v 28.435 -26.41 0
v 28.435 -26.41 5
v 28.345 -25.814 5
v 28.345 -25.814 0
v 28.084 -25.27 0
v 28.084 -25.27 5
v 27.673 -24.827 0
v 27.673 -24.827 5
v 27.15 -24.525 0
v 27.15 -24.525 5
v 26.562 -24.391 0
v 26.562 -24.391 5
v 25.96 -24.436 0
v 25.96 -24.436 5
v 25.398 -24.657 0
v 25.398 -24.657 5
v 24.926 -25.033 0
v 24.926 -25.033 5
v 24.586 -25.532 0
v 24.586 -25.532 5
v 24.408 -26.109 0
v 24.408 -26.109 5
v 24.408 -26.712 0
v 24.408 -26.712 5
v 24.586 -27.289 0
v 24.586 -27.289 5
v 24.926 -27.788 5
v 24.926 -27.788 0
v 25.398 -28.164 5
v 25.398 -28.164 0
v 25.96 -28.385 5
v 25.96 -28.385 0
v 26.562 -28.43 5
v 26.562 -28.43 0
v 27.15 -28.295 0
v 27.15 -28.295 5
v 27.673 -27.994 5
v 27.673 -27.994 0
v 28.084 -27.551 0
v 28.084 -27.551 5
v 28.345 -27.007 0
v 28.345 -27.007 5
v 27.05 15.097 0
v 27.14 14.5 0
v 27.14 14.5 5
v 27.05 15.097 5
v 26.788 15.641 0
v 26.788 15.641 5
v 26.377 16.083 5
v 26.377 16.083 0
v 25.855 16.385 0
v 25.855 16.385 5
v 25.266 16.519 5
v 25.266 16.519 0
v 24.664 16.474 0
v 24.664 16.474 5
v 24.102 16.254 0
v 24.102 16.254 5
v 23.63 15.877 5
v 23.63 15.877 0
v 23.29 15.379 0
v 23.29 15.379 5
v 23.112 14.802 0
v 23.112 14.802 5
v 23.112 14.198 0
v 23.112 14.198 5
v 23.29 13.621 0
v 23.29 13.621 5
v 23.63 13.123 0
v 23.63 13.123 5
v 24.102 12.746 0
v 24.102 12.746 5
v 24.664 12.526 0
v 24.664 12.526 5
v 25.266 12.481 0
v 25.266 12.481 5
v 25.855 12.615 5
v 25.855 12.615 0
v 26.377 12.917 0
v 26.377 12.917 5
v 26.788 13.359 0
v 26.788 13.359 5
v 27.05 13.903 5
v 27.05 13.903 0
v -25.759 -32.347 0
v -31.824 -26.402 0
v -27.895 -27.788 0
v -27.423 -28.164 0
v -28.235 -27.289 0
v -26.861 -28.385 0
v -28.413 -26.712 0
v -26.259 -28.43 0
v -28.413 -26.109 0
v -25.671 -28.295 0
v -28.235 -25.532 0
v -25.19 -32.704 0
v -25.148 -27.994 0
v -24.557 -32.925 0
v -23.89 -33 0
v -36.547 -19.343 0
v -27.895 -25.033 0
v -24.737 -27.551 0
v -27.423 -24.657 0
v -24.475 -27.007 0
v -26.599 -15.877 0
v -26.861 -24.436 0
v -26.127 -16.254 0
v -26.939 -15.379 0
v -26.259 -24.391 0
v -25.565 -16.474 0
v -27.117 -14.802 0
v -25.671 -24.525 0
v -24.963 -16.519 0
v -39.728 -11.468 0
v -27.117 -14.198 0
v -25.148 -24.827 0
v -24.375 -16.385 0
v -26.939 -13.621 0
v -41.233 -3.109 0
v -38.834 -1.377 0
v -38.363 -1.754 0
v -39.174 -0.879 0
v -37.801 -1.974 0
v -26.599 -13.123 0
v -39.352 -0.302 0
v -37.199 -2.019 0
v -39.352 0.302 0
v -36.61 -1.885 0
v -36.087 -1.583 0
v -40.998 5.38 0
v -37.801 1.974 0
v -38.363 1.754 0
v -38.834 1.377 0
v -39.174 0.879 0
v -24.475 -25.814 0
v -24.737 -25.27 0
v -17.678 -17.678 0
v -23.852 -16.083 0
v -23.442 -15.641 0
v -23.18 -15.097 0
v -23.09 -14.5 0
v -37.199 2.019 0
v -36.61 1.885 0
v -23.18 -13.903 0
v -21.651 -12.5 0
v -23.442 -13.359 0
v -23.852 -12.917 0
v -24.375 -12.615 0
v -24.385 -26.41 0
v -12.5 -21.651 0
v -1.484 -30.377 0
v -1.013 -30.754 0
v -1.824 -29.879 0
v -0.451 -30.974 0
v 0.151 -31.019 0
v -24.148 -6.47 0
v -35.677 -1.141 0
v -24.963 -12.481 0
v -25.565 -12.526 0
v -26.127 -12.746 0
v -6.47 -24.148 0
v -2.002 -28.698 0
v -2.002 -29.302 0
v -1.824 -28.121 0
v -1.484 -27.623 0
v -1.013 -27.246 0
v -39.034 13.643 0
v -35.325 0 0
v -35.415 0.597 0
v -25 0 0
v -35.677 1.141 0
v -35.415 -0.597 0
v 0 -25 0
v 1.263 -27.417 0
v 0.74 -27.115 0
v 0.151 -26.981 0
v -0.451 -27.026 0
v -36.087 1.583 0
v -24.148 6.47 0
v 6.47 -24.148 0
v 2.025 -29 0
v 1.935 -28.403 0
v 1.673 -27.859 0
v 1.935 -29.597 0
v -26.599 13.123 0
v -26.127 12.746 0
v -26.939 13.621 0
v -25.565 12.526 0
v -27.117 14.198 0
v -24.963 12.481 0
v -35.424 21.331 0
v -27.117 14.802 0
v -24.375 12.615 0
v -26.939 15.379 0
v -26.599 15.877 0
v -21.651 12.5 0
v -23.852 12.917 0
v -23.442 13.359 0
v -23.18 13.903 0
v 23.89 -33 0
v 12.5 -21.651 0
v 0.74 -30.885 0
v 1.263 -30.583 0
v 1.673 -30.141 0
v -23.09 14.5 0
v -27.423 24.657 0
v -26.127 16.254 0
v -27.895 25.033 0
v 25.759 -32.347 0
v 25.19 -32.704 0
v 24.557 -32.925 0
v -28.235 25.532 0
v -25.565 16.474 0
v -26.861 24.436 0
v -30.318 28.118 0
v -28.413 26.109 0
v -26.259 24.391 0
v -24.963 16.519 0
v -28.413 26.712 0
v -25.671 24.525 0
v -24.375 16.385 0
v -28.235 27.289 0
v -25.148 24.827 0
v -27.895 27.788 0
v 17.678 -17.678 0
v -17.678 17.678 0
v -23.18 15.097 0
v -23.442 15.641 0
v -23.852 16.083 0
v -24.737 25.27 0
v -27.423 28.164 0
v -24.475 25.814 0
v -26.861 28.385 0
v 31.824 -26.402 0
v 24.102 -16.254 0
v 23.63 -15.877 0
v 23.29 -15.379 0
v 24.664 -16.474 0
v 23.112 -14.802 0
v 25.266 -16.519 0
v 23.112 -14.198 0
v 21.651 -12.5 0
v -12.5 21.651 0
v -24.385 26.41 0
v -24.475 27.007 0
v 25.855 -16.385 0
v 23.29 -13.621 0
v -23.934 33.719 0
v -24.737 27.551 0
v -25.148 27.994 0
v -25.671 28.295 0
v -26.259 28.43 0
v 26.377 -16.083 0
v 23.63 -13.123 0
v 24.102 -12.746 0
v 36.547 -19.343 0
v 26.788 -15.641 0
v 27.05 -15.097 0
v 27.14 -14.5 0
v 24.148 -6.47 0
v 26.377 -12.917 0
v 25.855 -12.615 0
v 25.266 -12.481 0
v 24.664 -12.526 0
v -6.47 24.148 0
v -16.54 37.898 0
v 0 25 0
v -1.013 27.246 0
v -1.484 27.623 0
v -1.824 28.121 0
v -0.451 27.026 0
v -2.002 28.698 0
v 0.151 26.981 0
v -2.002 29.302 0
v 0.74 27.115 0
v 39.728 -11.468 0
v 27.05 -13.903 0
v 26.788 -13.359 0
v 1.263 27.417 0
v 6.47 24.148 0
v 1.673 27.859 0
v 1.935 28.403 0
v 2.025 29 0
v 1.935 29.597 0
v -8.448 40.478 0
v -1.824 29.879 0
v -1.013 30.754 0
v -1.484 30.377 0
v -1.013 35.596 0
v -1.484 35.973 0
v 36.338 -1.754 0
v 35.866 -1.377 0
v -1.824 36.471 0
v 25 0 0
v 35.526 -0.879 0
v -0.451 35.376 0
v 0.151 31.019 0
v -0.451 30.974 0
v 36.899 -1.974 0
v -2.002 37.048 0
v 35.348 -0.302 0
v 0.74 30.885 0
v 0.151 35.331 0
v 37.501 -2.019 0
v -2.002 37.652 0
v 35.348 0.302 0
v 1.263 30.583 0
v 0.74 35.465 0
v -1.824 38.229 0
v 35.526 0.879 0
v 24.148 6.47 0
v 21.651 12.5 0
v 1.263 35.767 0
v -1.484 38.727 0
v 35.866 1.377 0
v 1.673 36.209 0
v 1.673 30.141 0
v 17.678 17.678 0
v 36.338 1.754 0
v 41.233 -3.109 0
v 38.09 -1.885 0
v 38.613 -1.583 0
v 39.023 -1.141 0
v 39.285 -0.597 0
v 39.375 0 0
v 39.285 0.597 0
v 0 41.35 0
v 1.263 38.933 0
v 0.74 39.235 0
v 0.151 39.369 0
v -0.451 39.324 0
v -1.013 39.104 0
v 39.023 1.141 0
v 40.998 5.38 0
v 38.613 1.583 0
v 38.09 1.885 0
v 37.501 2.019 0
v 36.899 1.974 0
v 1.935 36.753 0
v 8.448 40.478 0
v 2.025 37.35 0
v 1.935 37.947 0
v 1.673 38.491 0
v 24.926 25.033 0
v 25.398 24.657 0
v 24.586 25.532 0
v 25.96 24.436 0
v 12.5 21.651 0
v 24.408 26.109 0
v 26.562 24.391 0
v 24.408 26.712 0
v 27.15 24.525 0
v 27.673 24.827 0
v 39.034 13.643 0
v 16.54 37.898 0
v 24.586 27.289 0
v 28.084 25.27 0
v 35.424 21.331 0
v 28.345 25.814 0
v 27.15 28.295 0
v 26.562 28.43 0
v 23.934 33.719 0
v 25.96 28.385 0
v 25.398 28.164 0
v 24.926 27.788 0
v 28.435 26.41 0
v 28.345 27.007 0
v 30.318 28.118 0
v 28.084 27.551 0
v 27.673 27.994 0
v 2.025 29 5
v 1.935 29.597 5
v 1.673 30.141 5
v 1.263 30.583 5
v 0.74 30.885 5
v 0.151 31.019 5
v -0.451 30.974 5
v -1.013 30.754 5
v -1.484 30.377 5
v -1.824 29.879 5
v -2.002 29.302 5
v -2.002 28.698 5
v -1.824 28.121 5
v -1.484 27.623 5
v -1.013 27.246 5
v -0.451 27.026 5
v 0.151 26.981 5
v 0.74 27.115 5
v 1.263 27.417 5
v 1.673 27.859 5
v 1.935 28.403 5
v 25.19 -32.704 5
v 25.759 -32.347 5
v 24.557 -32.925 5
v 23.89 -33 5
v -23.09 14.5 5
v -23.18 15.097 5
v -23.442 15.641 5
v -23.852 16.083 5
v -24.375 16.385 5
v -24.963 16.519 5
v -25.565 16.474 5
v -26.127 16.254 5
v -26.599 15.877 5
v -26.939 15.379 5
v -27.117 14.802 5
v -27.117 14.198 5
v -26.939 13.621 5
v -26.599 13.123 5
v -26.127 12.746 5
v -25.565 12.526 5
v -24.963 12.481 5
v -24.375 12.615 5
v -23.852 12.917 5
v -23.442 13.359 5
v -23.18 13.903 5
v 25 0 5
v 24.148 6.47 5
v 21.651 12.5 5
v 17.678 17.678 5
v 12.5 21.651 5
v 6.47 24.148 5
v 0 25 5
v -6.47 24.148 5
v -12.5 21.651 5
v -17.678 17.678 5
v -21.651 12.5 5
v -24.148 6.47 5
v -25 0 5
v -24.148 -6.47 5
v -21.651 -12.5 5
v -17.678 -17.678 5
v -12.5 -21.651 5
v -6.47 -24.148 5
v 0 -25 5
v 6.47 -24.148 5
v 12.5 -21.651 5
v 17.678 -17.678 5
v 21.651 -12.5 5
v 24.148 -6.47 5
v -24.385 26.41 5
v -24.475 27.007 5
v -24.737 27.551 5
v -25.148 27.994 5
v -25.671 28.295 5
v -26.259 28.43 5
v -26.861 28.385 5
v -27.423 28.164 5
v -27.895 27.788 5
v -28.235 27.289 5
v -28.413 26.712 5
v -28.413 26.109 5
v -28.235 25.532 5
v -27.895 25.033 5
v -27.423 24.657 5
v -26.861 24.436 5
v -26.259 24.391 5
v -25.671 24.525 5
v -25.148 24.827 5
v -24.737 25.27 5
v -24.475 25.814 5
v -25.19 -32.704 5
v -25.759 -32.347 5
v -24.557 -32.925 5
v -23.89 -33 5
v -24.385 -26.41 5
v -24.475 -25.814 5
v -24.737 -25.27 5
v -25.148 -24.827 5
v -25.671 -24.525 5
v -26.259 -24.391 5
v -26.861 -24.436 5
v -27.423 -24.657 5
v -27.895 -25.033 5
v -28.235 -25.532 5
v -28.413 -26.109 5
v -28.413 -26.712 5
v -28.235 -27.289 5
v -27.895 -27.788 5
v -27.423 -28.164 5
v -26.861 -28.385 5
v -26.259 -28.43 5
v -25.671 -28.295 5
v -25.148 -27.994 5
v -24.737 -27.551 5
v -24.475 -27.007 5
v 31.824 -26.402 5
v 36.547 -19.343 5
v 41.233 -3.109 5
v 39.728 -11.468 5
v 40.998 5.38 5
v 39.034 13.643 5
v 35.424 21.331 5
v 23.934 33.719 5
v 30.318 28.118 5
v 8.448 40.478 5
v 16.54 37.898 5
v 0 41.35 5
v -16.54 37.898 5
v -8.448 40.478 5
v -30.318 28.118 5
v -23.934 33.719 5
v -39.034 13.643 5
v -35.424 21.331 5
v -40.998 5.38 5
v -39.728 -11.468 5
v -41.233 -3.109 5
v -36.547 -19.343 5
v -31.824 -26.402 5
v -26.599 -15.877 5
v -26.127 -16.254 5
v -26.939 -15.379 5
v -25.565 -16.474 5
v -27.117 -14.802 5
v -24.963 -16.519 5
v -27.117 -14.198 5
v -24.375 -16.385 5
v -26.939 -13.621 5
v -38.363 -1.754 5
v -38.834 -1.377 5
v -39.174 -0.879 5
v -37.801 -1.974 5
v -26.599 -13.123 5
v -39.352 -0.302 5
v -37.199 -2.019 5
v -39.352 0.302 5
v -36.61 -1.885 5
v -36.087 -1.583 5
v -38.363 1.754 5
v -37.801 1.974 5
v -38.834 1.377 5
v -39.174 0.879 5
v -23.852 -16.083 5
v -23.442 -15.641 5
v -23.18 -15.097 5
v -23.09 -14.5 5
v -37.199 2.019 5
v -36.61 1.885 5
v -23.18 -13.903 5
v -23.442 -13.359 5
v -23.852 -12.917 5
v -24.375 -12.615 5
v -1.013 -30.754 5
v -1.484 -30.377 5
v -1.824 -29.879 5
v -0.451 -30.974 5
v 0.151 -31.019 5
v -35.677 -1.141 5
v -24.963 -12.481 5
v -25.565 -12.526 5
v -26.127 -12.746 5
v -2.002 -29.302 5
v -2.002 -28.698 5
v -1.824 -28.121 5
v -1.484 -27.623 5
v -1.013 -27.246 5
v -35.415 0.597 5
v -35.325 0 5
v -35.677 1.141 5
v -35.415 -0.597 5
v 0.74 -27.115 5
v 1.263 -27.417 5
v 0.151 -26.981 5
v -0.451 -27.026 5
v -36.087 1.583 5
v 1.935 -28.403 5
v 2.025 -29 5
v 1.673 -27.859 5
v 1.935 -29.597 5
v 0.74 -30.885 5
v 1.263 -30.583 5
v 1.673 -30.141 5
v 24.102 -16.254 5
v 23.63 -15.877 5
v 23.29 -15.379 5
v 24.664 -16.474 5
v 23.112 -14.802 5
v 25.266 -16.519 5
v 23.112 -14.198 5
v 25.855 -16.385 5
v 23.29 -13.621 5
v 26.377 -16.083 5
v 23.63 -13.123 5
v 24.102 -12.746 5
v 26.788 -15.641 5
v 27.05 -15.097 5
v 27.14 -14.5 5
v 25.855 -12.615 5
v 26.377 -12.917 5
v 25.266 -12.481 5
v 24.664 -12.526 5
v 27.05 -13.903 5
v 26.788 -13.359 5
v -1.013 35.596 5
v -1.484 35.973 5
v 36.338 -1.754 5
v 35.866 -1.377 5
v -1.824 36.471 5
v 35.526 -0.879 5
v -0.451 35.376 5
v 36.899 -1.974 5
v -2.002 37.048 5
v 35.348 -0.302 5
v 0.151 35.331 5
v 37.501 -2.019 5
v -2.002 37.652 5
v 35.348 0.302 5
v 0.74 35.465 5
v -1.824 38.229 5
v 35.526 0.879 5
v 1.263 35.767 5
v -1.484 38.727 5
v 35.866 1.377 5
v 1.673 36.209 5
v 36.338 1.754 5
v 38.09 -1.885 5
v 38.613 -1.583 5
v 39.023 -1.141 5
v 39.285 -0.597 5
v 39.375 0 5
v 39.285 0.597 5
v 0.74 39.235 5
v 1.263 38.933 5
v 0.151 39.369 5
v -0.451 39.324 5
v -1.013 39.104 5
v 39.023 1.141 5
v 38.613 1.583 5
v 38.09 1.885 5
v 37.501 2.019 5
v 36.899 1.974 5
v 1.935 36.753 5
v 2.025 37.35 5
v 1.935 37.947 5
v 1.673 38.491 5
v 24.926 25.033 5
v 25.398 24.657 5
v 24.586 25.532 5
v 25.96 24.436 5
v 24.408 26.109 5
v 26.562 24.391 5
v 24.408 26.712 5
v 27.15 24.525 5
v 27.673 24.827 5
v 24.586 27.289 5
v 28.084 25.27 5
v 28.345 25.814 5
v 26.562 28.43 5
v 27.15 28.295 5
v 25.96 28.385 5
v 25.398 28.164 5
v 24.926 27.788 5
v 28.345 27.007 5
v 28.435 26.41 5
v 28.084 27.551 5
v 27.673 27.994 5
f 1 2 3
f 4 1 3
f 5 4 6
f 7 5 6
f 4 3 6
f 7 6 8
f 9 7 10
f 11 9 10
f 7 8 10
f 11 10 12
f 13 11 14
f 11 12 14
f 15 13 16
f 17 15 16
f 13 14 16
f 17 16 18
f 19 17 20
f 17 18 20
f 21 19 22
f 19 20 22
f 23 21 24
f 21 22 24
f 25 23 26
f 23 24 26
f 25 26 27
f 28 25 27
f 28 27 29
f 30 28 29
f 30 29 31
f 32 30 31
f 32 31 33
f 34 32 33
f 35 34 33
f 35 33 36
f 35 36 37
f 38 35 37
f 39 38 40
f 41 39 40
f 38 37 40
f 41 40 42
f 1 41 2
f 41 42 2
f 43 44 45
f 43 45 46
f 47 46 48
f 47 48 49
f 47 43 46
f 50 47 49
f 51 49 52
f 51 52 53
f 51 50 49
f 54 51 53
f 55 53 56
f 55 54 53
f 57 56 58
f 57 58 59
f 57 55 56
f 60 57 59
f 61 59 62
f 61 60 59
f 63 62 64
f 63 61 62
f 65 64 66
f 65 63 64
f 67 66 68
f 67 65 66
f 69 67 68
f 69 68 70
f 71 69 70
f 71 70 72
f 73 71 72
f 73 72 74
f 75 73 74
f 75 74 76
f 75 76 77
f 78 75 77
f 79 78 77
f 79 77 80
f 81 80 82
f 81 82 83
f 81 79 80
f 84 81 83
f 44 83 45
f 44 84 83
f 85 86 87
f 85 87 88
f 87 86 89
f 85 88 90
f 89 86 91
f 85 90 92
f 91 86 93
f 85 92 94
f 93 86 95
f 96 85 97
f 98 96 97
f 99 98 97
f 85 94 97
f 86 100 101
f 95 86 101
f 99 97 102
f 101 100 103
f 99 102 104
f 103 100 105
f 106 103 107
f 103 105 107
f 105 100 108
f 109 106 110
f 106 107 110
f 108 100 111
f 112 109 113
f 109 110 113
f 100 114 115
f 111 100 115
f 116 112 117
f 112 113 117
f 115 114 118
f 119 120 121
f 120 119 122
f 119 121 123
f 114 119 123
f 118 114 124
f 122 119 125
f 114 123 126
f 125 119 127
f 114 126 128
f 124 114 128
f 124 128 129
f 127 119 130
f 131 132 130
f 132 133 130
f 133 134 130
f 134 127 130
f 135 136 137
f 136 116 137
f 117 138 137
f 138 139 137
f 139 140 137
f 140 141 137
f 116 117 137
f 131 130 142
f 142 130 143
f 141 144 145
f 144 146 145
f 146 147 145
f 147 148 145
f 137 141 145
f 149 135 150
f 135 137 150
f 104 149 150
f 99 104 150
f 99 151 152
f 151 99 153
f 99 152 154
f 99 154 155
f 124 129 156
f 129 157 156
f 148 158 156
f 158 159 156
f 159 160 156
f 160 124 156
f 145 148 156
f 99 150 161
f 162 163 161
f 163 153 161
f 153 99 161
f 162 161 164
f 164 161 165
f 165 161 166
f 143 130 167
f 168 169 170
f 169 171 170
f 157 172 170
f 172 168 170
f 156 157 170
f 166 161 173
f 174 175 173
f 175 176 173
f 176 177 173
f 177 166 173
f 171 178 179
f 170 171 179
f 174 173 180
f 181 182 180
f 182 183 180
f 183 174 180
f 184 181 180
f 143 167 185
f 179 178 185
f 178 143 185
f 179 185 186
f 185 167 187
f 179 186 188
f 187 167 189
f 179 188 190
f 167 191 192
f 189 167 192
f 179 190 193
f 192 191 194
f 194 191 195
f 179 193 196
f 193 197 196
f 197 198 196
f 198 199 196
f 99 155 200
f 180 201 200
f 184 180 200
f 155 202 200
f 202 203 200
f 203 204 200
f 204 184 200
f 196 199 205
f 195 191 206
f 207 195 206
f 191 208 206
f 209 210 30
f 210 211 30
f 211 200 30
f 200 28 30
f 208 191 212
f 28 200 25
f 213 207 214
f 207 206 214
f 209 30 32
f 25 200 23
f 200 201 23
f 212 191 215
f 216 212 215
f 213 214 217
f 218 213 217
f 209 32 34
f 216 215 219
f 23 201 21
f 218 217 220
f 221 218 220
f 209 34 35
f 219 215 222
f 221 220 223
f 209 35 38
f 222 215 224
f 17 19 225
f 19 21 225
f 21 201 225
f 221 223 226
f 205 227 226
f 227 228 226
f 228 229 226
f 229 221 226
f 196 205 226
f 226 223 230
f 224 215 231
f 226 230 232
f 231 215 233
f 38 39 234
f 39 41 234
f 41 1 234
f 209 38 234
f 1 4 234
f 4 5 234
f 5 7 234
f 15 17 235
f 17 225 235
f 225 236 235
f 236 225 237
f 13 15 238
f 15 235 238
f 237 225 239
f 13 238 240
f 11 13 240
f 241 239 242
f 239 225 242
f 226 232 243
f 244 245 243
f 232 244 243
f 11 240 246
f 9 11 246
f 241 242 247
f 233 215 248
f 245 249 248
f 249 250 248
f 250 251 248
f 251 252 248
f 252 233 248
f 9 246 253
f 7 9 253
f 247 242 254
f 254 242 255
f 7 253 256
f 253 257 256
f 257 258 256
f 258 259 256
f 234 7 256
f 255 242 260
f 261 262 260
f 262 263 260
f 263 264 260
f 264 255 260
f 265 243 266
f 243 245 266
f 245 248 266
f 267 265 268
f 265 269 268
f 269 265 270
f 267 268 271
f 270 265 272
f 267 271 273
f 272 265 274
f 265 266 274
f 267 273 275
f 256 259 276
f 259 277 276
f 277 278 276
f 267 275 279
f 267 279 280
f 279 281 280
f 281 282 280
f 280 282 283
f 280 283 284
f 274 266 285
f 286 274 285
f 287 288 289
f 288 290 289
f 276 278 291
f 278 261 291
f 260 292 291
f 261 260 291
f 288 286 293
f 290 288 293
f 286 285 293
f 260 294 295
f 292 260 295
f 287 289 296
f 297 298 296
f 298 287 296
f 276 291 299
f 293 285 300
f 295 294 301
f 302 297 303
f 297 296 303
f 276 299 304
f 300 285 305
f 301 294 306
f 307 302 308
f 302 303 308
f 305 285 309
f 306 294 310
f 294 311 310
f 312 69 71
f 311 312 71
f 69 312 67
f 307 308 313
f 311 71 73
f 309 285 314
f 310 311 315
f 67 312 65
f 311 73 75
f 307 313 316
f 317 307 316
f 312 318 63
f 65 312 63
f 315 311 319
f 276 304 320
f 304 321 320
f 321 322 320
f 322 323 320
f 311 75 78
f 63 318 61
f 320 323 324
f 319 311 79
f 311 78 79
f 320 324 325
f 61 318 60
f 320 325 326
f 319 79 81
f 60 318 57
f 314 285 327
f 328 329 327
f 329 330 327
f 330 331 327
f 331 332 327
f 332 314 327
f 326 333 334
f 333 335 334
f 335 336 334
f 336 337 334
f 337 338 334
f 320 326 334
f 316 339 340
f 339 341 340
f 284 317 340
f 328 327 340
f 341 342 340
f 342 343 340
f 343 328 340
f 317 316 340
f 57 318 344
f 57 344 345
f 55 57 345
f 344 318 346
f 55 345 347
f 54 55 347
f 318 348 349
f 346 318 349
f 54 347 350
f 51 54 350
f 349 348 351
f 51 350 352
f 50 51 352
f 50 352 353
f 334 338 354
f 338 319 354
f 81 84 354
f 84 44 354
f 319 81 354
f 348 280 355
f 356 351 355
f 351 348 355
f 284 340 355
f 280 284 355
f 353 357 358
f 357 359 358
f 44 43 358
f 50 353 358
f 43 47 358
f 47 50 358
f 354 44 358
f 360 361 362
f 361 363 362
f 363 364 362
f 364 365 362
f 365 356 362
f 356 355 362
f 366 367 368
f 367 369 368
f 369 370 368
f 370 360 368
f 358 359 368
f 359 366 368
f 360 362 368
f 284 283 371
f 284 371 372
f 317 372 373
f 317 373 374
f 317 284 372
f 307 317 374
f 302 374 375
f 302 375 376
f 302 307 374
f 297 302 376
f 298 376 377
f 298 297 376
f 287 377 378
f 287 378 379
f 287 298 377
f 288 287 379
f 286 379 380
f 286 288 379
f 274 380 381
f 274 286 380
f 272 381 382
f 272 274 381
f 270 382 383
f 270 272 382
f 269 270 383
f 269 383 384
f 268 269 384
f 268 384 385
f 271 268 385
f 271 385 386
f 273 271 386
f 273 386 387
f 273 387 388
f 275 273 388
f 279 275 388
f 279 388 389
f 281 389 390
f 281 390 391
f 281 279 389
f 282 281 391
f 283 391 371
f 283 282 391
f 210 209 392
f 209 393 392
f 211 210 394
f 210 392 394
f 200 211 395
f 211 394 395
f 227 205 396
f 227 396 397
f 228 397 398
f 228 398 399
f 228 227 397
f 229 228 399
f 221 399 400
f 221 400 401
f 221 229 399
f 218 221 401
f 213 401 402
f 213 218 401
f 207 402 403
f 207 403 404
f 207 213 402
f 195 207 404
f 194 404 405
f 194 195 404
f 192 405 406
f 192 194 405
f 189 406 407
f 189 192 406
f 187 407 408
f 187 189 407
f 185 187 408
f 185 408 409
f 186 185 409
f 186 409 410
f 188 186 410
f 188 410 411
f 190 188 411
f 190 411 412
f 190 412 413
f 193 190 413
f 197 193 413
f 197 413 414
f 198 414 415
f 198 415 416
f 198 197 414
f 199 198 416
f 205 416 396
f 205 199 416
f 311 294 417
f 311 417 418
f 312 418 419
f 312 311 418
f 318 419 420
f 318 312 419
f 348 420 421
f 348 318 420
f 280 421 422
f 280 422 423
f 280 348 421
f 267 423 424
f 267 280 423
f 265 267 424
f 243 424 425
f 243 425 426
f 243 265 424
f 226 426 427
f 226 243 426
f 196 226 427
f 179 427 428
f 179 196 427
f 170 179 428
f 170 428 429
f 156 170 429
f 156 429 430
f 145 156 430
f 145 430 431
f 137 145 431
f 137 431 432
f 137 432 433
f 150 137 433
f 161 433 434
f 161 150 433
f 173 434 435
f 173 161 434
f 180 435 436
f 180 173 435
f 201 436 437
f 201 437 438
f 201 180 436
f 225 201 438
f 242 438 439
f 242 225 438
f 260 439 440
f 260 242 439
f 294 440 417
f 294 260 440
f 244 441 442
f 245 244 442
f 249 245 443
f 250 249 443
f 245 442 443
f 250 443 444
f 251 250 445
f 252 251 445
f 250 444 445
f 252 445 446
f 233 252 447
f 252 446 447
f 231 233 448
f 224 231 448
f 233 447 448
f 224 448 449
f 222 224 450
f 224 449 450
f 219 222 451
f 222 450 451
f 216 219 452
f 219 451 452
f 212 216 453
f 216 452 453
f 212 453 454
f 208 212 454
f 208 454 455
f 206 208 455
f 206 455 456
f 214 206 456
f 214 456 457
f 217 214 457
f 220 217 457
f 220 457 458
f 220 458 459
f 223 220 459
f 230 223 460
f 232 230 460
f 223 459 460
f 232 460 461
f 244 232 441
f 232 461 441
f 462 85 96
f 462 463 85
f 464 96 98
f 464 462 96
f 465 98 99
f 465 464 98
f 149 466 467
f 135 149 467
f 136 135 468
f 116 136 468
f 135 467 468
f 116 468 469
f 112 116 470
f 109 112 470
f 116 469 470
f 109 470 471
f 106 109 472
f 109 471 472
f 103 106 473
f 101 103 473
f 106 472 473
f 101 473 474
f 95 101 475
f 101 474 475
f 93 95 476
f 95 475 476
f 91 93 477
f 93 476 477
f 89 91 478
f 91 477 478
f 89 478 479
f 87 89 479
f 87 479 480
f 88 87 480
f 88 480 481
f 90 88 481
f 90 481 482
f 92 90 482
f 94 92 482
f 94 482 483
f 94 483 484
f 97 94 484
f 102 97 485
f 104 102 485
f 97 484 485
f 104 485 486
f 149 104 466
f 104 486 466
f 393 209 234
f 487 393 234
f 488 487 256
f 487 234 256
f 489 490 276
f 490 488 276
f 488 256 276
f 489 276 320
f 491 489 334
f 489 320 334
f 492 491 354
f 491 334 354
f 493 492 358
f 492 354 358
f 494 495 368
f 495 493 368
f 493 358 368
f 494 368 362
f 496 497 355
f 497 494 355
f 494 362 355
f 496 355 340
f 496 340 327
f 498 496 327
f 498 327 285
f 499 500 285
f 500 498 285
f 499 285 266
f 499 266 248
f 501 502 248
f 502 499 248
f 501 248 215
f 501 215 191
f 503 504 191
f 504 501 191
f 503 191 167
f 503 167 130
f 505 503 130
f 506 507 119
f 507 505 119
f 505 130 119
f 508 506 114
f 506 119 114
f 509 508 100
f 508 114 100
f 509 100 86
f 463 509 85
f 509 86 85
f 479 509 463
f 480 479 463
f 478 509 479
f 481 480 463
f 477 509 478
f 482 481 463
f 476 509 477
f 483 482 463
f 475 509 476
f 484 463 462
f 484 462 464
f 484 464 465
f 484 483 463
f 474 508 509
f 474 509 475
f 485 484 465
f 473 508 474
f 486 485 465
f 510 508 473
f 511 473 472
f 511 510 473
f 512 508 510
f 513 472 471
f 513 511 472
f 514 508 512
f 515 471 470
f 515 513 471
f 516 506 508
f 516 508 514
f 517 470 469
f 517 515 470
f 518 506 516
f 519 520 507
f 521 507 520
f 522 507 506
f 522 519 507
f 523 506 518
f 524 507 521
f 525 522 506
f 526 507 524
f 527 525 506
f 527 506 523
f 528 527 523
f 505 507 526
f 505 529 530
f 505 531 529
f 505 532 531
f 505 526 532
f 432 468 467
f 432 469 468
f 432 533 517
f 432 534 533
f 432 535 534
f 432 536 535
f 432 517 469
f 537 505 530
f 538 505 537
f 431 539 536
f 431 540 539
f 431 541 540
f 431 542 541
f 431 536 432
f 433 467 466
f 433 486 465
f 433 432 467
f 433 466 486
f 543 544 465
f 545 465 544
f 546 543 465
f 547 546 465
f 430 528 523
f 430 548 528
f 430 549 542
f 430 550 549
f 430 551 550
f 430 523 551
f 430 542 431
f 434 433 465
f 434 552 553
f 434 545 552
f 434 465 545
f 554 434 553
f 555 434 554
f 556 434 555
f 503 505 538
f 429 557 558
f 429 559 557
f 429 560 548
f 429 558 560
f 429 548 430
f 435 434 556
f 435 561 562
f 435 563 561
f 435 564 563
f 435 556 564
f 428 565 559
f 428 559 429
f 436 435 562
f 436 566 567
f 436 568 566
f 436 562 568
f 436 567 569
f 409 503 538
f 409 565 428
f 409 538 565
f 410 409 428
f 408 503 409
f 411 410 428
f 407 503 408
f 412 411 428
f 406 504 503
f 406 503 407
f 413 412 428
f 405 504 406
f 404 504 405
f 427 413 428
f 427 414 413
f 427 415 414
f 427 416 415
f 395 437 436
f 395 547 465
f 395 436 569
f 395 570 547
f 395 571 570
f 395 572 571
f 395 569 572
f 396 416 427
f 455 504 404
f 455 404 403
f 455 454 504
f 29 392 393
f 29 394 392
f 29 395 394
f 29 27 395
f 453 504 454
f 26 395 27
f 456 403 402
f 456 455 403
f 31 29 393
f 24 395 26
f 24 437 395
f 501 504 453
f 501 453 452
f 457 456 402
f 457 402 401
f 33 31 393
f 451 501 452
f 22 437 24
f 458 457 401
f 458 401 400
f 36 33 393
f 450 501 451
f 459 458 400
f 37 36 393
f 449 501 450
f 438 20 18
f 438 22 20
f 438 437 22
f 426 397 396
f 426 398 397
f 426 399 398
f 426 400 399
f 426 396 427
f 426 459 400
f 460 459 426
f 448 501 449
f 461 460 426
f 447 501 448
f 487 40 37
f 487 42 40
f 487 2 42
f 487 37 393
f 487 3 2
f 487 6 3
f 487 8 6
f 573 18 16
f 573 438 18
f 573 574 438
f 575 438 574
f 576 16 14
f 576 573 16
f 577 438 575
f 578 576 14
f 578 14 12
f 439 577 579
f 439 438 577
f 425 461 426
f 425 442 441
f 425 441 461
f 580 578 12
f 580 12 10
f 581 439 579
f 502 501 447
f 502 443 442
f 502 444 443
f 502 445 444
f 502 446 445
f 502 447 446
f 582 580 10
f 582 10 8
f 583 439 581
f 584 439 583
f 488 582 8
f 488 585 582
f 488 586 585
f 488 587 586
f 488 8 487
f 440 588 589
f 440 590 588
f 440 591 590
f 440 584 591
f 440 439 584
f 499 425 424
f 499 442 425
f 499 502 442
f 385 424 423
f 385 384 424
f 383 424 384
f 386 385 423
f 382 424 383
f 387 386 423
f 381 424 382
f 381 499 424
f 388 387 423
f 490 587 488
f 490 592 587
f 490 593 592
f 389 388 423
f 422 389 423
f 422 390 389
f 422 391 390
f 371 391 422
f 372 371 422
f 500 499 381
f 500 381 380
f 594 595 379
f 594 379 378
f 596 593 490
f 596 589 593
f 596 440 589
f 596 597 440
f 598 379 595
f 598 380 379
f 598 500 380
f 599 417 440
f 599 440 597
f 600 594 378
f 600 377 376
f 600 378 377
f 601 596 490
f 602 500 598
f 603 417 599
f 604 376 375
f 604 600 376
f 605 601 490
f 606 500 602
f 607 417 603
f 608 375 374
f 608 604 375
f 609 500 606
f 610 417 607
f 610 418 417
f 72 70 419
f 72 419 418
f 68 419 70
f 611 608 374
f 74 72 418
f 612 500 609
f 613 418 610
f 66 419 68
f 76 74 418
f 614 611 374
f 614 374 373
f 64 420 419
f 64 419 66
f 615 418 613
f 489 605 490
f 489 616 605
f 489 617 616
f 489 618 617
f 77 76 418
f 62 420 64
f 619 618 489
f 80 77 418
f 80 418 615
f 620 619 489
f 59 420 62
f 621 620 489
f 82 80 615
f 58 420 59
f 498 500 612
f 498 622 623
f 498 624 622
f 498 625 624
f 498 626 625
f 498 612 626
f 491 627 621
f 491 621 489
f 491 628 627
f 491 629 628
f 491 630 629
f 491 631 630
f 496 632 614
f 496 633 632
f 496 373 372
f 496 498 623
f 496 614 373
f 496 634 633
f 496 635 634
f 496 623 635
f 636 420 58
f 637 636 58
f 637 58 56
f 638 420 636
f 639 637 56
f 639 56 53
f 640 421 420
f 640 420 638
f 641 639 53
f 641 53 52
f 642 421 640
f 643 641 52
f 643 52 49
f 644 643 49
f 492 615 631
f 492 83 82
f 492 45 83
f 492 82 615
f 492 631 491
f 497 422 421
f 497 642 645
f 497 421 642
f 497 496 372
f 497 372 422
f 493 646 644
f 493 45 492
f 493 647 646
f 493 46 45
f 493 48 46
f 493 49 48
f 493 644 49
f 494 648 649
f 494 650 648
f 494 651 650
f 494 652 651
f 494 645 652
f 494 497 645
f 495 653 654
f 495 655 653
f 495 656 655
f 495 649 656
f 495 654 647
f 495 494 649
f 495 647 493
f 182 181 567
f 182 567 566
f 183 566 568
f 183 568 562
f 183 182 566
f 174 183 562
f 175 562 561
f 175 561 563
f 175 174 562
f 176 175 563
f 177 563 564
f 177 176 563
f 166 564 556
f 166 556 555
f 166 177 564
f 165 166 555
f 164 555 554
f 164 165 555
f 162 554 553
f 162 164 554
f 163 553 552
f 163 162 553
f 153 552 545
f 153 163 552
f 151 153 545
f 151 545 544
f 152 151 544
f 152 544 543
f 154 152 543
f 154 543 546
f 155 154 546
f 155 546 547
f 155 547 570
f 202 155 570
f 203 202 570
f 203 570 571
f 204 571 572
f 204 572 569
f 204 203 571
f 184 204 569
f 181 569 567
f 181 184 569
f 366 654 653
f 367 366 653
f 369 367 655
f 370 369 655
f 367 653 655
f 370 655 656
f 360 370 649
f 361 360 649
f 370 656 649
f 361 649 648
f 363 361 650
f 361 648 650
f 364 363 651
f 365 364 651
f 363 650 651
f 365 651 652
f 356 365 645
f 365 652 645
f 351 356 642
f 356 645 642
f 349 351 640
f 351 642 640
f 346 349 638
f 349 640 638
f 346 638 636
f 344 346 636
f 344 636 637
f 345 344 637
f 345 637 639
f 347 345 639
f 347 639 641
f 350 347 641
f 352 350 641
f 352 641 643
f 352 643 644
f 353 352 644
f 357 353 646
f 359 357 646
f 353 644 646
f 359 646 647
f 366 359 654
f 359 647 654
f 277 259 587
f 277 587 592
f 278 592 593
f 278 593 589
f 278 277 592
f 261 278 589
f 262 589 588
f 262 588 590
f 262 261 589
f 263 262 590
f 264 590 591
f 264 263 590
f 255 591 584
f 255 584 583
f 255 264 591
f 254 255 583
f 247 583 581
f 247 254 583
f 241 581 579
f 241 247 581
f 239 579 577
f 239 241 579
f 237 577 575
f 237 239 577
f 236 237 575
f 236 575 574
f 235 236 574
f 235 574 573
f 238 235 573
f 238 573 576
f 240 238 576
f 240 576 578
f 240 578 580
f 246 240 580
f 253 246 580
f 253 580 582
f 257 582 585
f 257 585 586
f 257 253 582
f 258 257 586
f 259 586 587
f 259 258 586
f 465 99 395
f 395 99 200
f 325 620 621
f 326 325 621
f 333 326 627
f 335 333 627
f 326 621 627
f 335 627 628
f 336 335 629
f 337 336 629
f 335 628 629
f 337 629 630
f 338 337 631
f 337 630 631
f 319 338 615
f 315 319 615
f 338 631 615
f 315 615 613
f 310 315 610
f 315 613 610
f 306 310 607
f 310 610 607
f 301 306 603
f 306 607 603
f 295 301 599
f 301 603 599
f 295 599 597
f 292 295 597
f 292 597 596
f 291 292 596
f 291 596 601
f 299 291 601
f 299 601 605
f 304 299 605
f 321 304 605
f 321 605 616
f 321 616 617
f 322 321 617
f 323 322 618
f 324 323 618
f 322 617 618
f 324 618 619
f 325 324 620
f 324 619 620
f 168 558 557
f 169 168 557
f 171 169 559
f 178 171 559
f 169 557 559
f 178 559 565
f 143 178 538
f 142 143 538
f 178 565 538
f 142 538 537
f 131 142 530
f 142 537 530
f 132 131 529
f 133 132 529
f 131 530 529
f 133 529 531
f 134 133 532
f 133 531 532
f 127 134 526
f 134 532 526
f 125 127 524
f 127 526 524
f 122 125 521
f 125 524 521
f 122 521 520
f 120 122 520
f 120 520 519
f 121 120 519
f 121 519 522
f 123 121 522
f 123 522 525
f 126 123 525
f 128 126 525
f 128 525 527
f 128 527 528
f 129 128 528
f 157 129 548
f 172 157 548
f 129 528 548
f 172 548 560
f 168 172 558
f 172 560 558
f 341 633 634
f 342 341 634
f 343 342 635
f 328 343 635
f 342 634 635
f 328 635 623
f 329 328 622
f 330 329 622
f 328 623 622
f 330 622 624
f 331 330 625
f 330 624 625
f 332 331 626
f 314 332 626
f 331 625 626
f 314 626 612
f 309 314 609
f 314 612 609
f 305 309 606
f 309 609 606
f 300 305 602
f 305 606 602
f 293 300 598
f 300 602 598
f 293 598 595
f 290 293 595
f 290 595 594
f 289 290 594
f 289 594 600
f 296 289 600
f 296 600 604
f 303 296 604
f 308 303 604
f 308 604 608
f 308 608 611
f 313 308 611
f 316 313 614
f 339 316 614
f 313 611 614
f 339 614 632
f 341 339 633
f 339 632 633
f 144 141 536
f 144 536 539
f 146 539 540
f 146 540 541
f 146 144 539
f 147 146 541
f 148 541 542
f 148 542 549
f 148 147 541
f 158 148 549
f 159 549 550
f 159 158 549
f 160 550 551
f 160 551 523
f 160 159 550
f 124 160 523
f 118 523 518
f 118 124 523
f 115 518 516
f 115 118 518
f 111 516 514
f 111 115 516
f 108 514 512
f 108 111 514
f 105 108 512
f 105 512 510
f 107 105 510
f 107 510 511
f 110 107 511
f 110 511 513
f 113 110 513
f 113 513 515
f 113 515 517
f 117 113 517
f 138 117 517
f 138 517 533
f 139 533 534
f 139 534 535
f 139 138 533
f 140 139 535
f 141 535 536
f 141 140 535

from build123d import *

# Parameters (mm, degrees)
SKETCH_1_R          = 41.35
SKETCH_1_R_2        = 2.025
SKETCH_1_R_3        = 25
EXTRUDE_1_DEPTH     = 5
SKETCH_2_R          = 2.025
CUT_EXTRUDE_1_DEPTH = 5
CUT_EXTRUDE_START   = -5
CUT_EXTRUDE_2_DEPTH = 5
FILLET_1_R          = 3


with BuildPart() as part:
    # 草图1 → 凸台-拉伸1 (new body)
    with BuildSketch(Plane.XY):
        Circle(SKETCH_1_R)
        with Locations((0, 29)):
            Circle(SKETCH_1_R_2, mode=Mode.SUBTRACT)
        with Locations((25.11473671, 14.5)):
            Circle(SKETCH_1_R_2, mode=Mode.SUBTRACT)
        with Locations((25.11473671, -14.5)):
            Circle(SKETCH_1_R_2, mode=Mode.SUBTRACT)
        with Locations((0, -29)):
            Circle(SKETCH_1_R_2, mode=Mode.SUBTRACT)
        with Locations((-25.11473671, -14.5)):
            Circle(SKETCH_1_R_2, mode=Mode.SUBTRACT)
        with Locations((-25.11473671, 14.5)):
            Circle(SKETCH_1_R_2, mode=Mode.SUBTRACT)
        Circle(SKETCH_1_R_3, mode=Mode.SUBTRACT)
    extrude(amount=EXTRUDE_1_DEPTH)

    # 草图2 → 切除-拉伸1 (cut)
    with BuildSketch(Plane.XY.offset(5)):
        with Locations((0, 37.35)):
            Circle(SKETCH_2_R)
        with Locations((26.410438277, 26.410438277)):
            Circle(SKETCH_2_R)
        with Locations((37.35, 0)):
            Circle(SKETCH_2_R)
        with Locations((26.410438277, -26.410438277)):
            Circle(SKETCH_2_R)
        with Locations((0, -37.35)):
            Circle(SKETCH_2_R)
        with Locations((-26.410438277, -26.410438277)):
            Circle(SKETCH_2_R)
        with Locations((-37.35, 0)):
            Circle(SKETCH_2_R)
        with Locations((-26.410438277, 26.410438277)):
            Circle(SKETCH_2_R)
    extrude(amount=-CUT_EXTRUDE_1_DEPTH, mode=Mode.SUBTRACT)

    # 草图3 → 切除-拉伸2 (cut)
    with BuildSketch(Plane.XY.offset(5).offset(CUT_EXTRUDE_START)):
        with BuildLine():
            Line((-24.916309919, -33), (24.916309919, -33))
            ThreePointArc((24.916309919, -33), (0, -41.35), (-24.916309919, -33))
        make_face()
    extrude(amount=CUT_EXTRUDE_2_DEPTH, mode=Mode.SUBTRACT)

    # 圆角1
    fillet_1_edges = [part.edges().sort_by_distance(p)[0] for p in [
        (24.916309919, -33, 2.5),
        (-24.916309919, -33, 2.5),
    ]]
    fillet(fillet_1_edges, radius=FILLET_1_R)


solid = part.part
